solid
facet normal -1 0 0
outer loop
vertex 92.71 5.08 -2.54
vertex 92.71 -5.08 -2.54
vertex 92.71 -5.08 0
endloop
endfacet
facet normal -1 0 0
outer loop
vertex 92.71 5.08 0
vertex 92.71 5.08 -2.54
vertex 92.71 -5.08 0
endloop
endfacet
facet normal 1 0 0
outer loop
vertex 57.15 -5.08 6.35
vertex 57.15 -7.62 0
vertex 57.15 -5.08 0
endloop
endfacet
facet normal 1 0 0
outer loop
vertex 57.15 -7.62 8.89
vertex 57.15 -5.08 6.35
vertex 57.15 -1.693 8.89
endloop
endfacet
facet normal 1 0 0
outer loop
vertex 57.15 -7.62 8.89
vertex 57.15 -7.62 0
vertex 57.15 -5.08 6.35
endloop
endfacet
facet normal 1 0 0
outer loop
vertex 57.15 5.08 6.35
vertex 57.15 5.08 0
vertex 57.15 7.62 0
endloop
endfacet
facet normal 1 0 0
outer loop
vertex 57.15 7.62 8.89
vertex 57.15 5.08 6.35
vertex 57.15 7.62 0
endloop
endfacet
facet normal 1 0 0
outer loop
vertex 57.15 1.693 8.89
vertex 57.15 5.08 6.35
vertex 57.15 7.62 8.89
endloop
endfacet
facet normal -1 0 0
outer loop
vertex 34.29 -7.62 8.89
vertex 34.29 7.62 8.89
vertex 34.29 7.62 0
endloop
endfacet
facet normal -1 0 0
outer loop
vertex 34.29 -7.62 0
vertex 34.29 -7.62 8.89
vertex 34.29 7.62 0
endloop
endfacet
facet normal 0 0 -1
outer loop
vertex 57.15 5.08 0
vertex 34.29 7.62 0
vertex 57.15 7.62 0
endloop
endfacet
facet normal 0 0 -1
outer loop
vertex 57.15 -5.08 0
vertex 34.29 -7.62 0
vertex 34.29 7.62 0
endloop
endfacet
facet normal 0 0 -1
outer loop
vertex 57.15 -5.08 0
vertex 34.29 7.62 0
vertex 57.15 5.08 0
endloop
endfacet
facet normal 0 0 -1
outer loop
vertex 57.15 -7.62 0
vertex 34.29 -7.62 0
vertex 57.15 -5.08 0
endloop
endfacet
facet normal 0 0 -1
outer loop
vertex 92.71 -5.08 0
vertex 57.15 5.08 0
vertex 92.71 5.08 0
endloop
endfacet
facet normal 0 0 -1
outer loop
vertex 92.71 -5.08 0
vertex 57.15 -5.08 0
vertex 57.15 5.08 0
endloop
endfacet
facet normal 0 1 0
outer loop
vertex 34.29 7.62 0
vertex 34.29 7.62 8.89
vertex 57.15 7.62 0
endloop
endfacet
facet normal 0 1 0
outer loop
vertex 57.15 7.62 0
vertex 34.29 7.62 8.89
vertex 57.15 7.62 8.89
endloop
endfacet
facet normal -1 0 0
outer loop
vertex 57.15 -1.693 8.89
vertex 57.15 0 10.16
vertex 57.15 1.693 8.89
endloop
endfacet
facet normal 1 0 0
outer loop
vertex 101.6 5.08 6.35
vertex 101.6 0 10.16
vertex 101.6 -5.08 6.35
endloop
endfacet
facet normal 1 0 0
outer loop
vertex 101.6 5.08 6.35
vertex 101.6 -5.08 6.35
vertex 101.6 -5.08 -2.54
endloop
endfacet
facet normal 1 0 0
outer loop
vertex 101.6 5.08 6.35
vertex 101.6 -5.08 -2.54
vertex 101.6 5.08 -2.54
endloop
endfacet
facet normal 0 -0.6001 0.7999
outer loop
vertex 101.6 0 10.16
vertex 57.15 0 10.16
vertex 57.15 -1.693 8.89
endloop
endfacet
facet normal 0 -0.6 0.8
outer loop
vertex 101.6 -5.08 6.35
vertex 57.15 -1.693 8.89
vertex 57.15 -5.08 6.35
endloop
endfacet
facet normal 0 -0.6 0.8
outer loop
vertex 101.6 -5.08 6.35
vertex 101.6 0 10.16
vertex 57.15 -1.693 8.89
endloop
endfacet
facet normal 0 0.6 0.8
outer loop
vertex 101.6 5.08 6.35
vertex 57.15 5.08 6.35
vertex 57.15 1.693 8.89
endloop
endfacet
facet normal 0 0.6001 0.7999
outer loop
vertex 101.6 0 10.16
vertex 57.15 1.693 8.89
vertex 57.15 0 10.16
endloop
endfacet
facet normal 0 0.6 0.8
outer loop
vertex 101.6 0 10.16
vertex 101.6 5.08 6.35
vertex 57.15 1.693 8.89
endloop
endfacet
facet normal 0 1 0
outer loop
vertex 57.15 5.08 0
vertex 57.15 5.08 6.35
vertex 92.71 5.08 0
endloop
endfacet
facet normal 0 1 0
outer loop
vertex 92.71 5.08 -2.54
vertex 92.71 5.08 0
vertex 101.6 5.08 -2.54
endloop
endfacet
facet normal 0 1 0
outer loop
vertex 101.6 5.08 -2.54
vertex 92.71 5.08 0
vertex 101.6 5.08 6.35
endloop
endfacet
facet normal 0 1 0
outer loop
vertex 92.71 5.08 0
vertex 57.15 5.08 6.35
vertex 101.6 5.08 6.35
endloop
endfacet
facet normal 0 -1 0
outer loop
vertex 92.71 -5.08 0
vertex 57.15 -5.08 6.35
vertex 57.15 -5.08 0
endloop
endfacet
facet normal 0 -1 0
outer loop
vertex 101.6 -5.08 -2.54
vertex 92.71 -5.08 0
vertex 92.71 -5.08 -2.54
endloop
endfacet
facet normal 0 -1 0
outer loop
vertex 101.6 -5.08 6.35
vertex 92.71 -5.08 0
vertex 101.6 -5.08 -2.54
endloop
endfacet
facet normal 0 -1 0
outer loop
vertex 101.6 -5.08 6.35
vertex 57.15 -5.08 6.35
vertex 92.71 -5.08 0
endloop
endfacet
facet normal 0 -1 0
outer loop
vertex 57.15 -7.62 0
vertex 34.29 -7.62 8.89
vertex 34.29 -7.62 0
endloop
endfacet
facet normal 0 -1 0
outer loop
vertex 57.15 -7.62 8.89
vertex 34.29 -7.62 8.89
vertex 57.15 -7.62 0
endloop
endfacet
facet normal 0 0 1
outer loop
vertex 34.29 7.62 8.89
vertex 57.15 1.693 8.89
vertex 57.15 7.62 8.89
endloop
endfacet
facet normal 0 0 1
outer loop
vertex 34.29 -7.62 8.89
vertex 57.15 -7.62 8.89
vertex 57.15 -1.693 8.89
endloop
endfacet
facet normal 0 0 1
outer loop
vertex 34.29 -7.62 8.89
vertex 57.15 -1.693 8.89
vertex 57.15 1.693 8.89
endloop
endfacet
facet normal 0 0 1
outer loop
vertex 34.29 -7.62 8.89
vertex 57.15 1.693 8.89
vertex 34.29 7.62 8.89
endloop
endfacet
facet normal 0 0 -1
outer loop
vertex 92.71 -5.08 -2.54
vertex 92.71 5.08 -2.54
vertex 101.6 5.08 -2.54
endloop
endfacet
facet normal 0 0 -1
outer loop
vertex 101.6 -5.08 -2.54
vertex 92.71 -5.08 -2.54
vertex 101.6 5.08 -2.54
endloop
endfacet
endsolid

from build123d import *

# Parameters (mm, degrees)
F1_DEPTH = 7.62
F2_DEPTH = 7.62
F0_W     = 35.56
F0_H     = 6.35
F0_W_2   = 8.89
F0_H_2   = 2.54
F3_DEPTH = 5.08
F4_DEPTH = 5.08
F6_DEPTH = 44.45


with BuildPart() as f1:
    # F0 (on Front) → F1 (new body)
    with BuildSketch(Plane.XZ):
        Polygon((34.29, 8.89), (34.29, 0), (57.15, 0), (57.15, 6.35), (57.15, 8.89), align=None)
    extrude(amount=F1_DEPTH)

    # F0 (on Front) → F2 (join)
    with BuildSketch(Plane.XZ):
        Polygon((34.29, 8.89), (34.29, 0), (57.15, 0), (57.15, 6.35), (57.15, 8.89), align=None)
    extrude(amount=-F2_DEPTH)

    # F0 (on Front) → F3 (join)
    with BuildSketch(Plane.XZ):
        with Locations((74.93, 3.175)):
            Rectangle(F0_W, F0_H)
        with Locations((97.155, 3.175)):
            Rectangle(F0_W_2, F0_H)
        with Locations((97.155, -1.27)):
            Rectangle(F0_W_2, F0_H_2)
    extrude(amount=F3_DEPTH)

    # F0 (on Front) → F4 (join)
    with BuildSketch(Plane.XZ):
        with Locations((74.93, 3.175)):
            Rectangle(F0_W, F0_H)
        with Locations((97.155, 3.175)):
            Rectangle(F0_W_2, F0_H)
        with Locations((97.155, -1.27)):
            Rectangle(F0_W_2, F0_H_2)
    extrude(amount=-F4_DEPTH)

    # F5 (on face) → F6 (join)
    with BuildSketch(Plane.YZ.offset(101.6)):
        Polygon((0, 10.16), (0, 6.35), (5.08, 6.35), align=None)
        Polygon((-5.08, 6.35), (0, 6.35), (0, 10.16), align=None)
    extrude(amount=-F6_DEPTH)


solid = f1.part
